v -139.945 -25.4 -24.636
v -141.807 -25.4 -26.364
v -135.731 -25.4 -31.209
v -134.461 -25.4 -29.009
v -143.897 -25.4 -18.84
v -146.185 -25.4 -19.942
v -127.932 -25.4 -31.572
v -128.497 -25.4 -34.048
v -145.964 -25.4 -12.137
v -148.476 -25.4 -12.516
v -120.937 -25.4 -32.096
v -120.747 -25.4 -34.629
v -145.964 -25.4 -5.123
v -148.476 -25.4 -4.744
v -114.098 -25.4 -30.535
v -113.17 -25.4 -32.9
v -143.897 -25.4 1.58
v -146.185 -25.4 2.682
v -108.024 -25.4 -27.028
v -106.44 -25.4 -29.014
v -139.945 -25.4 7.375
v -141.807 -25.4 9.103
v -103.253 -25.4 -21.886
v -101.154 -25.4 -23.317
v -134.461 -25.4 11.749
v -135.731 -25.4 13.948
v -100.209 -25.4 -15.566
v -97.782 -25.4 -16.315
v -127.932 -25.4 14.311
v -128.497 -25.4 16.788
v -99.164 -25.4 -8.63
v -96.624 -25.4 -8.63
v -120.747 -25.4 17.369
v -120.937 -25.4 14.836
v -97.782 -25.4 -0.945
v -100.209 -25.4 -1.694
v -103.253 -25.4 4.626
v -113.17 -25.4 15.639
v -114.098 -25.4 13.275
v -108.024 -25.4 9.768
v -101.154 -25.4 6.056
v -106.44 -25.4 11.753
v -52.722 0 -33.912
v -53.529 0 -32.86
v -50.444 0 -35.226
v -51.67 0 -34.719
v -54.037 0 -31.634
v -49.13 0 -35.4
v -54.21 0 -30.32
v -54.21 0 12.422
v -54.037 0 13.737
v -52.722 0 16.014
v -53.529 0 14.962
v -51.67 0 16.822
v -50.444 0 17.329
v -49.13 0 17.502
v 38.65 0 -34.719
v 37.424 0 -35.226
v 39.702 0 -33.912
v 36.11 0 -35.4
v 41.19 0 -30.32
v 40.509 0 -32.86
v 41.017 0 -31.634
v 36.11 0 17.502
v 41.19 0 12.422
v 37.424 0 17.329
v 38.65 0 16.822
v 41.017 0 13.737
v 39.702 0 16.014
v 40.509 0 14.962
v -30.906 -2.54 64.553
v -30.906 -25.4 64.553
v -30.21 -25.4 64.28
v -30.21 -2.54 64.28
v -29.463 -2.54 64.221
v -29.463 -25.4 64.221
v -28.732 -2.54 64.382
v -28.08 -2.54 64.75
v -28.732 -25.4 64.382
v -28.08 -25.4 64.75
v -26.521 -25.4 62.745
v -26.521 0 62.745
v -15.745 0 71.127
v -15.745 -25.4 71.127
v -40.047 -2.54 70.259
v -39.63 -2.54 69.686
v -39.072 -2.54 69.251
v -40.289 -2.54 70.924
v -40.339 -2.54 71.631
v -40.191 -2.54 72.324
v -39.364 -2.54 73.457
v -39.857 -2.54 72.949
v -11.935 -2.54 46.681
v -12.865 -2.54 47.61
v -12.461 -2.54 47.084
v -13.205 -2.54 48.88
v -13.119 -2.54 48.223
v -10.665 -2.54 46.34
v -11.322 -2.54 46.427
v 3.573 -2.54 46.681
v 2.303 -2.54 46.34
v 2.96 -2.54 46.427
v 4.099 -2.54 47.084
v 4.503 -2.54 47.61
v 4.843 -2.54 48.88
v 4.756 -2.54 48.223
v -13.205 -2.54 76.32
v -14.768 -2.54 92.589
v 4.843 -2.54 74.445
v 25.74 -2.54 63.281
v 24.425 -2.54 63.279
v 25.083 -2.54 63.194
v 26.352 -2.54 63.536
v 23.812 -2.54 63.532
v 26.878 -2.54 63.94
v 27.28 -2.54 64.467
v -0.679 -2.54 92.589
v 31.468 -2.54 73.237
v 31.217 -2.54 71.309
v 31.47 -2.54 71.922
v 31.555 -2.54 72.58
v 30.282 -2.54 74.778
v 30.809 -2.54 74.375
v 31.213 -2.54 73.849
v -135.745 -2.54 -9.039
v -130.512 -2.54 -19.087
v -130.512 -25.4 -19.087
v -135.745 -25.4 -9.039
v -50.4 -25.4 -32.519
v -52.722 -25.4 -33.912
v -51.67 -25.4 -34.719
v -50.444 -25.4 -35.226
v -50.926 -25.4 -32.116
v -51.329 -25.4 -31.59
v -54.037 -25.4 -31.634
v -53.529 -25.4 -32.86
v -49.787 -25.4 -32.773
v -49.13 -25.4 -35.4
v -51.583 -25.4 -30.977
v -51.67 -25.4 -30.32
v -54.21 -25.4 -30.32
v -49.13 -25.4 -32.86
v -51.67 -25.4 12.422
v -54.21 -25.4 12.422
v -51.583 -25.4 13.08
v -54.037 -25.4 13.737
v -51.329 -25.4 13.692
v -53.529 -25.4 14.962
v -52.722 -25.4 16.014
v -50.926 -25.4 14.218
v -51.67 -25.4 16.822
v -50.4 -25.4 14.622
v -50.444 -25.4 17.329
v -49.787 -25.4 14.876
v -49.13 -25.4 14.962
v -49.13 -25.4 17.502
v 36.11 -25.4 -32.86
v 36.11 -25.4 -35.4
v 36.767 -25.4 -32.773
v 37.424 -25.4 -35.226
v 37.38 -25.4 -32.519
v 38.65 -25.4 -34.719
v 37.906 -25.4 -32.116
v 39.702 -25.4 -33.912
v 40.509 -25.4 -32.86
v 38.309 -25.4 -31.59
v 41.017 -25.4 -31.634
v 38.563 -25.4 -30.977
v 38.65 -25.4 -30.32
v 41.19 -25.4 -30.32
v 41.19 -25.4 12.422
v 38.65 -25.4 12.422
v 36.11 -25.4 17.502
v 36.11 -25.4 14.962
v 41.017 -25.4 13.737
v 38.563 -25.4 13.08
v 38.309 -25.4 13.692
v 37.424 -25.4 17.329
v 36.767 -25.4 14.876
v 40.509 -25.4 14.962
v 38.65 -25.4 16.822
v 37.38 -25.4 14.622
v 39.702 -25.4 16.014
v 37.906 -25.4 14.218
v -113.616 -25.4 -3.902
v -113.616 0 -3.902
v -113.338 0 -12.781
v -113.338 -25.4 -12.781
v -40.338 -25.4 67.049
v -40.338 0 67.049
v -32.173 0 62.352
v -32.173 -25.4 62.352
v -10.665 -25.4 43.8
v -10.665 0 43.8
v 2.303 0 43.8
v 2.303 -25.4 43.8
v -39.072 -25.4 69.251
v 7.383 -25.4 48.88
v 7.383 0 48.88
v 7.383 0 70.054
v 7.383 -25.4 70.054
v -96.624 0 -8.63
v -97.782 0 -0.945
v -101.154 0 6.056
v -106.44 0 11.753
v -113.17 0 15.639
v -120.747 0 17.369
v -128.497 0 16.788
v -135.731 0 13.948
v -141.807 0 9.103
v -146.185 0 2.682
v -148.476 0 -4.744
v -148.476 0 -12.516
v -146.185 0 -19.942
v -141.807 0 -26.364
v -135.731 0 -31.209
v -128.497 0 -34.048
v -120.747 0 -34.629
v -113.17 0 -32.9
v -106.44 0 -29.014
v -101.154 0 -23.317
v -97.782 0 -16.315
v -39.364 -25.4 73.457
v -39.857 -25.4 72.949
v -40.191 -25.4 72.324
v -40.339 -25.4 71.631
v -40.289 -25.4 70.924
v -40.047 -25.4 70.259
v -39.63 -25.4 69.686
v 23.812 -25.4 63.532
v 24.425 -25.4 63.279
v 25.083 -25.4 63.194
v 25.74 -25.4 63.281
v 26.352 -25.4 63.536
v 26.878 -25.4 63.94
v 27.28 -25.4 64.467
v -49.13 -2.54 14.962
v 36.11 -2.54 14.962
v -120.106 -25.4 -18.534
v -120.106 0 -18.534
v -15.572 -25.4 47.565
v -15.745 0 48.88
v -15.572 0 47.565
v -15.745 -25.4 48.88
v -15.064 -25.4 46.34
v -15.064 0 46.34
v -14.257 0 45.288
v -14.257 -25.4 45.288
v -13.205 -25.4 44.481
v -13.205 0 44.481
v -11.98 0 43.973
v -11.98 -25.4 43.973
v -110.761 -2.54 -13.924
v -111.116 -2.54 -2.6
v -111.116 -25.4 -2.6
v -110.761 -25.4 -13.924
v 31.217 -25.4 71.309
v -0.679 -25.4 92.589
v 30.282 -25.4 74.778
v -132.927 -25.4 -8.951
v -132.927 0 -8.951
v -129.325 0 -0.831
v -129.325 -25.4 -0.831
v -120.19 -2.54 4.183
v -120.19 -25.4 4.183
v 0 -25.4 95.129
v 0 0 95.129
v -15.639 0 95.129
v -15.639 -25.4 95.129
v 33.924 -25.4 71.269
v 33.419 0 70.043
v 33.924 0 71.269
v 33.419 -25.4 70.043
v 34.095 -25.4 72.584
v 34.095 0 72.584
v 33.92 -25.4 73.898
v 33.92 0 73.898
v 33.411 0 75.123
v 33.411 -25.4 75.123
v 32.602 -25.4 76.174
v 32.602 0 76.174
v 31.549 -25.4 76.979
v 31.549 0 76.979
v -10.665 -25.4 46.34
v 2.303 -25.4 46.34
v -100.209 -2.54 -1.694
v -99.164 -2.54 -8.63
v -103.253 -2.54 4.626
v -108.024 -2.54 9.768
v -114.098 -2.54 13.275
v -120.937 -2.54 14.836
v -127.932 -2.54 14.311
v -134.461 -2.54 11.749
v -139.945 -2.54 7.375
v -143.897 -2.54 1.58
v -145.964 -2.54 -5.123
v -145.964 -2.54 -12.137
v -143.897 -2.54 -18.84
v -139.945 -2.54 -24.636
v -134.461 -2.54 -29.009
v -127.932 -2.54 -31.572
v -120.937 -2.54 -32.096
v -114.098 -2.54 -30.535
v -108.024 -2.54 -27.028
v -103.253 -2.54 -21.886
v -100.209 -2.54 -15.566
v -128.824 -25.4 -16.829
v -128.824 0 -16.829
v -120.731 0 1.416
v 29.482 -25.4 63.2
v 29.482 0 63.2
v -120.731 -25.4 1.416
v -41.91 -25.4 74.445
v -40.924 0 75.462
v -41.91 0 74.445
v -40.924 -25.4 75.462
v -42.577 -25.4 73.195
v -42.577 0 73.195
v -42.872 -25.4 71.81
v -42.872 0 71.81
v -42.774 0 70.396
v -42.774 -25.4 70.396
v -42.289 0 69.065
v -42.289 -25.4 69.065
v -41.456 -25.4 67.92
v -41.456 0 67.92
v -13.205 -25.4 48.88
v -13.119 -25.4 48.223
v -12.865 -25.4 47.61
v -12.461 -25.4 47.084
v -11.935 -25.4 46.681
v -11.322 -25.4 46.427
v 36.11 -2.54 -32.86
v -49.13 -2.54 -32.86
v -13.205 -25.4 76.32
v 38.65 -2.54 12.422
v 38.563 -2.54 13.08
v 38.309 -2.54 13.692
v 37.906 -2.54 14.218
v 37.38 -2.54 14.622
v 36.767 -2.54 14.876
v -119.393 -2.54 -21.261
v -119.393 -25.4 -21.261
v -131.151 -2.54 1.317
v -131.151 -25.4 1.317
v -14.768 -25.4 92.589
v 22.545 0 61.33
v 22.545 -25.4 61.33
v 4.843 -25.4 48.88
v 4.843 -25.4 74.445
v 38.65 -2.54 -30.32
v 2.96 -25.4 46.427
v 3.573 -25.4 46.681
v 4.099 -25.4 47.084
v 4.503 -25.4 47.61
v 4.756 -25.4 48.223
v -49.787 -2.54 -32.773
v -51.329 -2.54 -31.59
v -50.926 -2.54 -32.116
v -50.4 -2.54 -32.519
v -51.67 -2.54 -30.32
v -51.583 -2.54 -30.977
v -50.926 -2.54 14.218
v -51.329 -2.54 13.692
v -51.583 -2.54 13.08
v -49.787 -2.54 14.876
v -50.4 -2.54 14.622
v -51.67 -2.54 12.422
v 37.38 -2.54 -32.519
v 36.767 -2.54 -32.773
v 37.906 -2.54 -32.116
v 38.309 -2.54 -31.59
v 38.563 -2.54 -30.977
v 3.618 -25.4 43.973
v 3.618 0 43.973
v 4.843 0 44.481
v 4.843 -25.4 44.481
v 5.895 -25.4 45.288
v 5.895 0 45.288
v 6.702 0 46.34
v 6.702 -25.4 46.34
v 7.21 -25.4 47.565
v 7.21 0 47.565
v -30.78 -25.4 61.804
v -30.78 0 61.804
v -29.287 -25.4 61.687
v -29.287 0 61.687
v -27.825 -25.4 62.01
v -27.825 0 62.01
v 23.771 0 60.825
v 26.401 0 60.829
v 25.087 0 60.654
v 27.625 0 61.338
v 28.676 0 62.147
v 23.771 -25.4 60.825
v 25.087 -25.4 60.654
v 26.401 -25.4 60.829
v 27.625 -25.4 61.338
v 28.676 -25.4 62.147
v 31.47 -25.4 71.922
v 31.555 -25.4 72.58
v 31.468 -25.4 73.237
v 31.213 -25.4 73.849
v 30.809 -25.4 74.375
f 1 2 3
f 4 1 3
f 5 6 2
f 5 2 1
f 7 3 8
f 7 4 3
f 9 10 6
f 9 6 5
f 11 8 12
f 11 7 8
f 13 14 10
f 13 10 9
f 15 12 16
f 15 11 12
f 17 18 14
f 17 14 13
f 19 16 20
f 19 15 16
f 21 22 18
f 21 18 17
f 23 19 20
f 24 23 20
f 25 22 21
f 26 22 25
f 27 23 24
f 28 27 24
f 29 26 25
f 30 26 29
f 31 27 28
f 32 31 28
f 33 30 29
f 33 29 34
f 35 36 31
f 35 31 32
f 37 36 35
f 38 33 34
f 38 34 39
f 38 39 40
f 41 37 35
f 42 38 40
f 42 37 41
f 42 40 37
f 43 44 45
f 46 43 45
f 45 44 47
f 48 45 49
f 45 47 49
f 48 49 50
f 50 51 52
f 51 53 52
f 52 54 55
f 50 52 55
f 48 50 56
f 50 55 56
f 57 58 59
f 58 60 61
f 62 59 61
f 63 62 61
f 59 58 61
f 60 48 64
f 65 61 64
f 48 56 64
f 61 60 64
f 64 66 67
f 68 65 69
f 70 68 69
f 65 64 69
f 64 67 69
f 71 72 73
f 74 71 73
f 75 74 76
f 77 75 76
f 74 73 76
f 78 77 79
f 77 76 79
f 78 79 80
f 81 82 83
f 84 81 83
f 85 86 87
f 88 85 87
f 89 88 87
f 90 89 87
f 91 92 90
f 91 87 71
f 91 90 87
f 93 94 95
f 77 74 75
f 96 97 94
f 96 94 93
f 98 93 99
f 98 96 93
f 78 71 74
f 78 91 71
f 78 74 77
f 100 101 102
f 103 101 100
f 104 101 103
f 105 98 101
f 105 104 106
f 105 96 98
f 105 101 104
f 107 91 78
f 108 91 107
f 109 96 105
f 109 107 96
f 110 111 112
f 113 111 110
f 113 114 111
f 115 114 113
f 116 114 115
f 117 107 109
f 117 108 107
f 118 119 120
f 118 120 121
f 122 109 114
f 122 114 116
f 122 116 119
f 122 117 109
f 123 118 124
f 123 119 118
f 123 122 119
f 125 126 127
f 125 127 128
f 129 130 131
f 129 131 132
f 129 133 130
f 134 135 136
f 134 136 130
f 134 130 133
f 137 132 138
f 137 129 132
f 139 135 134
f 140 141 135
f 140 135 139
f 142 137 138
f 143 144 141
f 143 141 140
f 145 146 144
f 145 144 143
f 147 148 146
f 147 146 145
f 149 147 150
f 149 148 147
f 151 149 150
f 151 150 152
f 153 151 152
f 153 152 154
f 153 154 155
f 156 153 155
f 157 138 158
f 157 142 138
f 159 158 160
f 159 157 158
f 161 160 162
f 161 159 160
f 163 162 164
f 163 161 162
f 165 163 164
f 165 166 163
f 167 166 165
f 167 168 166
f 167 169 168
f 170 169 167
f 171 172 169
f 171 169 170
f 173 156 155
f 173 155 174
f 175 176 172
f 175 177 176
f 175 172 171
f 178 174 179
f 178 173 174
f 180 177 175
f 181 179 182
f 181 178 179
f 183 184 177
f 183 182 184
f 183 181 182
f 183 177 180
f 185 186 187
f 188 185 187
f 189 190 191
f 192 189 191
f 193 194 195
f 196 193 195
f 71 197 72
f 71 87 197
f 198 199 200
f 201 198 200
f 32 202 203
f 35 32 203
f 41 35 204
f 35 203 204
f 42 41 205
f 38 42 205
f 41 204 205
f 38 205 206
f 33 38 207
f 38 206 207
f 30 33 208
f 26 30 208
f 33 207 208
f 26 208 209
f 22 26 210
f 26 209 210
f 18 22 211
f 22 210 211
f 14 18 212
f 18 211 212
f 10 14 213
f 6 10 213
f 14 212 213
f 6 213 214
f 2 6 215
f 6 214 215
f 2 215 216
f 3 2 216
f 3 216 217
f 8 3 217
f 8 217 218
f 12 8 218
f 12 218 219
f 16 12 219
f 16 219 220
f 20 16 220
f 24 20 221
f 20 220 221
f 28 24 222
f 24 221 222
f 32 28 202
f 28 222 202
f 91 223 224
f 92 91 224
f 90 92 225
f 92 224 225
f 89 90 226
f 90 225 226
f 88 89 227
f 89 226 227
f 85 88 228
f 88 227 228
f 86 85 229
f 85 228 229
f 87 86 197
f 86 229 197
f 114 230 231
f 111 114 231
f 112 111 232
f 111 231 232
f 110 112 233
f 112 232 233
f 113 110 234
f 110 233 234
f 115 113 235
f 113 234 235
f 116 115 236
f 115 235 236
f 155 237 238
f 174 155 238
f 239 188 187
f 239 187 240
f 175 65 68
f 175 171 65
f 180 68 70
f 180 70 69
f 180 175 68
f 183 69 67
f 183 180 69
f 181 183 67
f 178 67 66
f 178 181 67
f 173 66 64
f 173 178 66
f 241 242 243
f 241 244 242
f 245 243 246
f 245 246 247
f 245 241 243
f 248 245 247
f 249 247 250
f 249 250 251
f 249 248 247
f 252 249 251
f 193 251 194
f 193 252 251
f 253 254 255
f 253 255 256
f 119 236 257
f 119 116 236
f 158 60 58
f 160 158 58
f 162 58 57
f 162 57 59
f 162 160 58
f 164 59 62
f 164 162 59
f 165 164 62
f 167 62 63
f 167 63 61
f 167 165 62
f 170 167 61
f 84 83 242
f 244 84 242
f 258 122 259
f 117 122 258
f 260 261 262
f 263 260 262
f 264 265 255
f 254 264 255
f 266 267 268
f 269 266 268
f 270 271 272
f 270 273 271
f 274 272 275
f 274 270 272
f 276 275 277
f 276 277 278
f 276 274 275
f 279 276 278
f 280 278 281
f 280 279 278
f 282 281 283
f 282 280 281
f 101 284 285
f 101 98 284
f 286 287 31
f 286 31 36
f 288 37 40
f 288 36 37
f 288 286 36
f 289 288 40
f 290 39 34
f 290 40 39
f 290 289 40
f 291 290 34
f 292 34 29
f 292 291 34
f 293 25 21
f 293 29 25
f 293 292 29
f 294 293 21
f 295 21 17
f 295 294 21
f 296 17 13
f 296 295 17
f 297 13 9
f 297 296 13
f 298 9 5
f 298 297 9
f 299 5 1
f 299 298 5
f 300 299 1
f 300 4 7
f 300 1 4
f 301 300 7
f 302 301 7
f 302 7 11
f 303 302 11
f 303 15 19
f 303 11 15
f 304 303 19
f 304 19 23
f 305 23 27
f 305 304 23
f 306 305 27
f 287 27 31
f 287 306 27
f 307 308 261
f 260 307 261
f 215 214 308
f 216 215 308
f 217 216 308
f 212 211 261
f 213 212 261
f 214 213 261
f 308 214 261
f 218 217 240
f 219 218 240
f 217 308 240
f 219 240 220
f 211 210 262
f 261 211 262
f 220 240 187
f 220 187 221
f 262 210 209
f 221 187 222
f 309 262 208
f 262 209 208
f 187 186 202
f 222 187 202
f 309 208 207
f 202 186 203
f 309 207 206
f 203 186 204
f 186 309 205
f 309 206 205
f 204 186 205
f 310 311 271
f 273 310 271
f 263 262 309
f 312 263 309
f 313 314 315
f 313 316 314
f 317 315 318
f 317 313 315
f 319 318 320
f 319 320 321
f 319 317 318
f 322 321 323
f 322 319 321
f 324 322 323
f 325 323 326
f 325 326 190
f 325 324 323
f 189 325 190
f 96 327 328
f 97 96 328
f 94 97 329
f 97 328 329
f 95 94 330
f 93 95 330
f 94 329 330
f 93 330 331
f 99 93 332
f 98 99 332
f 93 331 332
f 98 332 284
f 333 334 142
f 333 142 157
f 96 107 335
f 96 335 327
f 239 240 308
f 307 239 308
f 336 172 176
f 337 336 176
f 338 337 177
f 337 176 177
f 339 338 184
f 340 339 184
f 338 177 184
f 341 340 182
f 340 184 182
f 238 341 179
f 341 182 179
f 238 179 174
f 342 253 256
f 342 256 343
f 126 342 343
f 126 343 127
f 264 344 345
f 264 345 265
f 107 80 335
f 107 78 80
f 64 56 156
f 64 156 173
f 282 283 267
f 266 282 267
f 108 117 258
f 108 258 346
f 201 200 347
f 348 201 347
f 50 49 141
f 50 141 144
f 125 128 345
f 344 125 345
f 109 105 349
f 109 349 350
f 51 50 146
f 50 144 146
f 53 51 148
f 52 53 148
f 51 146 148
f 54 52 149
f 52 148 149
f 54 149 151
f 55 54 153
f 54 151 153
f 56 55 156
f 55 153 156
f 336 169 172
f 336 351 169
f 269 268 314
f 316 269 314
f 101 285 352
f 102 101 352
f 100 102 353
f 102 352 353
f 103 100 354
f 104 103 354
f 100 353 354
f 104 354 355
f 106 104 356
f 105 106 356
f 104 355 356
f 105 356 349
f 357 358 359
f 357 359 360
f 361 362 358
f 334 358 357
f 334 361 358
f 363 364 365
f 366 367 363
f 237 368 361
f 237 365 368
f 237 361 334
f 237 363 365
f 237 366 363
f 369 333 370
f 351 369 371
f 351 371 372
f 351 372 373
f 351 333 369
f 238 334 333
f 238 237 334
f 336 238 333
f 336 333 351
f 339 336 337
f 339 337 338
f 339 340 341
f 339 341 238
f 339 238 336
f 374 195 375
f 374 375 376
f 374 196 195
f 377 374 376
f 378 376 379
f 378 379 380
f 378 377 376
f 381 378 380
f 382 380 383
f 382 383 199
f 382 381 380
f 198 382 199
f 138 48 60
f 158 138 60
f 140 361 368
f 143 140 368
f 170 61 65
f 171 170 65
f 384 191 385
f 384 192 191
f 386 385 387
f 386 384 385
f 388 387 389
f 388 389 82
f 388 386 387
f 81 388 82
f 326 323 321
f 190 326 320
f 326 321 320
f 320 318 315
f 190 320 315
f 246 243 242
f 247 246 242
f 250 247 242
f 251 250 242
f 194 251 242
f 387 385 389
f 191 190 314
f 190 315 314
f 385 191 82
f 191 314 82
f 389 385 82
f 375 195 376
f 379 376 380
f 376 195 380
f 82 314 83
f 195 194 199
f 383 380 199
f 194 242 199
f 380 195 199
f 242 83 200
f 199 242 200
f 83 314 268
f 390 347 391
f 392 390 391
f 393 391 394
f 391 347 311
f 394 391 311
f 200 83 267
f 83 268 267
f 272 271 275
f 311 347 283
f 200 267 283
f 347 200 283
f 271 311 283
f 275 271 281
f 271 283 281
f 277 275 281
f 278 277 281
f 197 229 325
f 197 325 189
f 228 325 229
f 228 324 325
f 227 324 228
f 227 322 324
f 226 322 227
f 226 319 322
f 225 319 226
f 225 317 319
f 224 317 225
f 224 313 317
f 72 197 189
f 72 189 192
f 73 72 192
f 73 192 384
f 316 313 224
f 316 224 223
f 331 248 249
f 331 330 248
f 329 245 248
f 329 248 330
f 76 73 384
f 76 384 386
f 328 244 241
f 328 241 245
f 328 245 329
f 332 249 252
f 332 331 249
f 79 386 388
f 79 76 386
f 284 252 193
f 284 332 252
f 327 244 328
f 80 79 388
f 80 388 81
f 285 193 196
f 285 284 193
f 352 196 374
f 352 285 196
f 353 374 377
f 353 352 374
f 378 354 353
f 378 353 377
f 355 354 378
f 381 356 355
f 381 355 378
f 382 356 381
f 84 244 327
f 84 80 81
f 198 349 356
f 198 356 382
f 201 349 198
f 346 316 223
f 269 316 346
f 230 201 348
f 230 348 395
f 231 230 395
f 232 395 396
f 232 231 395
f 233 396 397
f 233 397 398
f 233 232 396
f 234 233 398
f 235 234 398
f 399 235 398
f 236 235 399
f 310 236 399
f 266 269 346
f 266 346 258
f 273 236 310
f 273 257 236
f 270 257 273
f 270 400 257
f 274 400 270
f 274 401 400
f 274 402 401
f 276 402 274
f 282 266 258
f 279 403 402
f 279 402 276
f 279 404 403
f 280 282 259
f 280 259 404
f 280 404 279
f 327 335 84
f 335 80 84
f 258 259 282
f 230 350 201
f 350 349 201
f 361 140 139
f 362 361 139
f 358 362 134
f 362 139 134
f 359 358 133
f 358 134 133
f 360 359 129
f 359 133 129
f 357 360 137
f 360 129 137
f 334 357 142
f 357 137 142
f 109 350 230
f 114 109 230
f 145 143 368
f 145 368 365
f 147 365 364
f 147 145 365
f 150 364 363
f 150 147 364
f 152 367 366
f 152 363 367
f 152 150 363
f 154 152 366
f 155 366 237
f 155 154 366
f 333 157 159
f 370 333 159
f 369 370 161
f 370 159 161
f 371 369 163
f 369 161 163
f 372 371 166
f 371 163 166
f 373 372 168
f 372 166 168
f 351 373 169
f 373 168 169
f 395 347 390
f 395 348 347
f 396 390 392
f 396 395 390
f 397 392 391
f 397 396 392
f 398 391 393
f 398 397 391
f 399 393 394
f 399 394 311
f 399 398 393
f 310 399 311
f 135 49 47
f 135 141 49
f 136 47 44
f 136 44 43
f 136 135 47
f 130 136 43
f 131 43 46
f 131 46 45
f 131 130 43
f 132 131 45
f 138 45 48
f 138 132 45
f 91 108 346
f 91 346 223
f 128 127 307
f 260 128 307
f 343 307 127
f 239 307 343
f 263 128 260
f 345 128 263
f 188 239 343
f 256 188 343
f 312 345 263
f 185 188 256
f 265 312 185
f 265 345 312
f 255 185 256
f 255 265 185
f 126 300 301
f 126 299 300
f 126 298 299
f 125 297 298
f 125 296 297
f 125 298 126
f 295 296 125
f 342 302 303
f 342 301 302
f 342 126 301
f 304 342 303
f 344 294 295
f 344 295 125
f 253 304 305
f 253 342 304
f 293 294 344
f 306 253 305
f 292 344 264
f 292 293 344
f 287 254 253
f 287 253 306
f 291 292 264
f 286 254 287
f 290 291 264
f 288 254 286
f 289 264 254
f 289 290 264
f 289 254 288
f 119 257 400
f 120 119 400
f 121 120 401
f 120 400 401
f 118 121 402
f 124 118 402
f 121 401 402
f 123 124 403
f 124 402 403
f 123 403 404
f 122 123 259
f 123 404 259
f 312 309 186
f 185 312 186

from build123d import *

# Parameters (mm, degrees)
F0_W     = 95.3992977738
F0_H     = 52.9018118978
F1_DEPTH = 25.4
F0_R     = 26.0717116196
F2_R     = 5.08
F2_2_R   = 5.08
F3_T     = -2.54
F3_2_T   = -2.54
F3_3_T   = -2.54


with BuildPart() as f1:
    # F0 (on Front) → F1 (new body)
    with BuildSketch(Plane.XZ):
        with Locations((-6.5099671483, -8.9486204088)):
            Rectangle(F0_W, F0_H)
    extrude(amount=F1_DEPTH)

    # F2
    f2_edges = [f1.edges().sort_by_distance(p)[0] for p in [
        (41.189682, -12.7, 17.502286),
        (-54.209616, -12.7, 17.502286),
        (41.189682, -12.7, -35.399526),
        (-54.209616, -12.7, -35.399526),
    ]]
    fillet(f2_edges, radius=F2_R)

    # F3
    f3_openings = [f1.faces().sort_by_distance(p)[0] for p in [
        (-6.509967, -25.4, -8.94862),
    ]]
    offset(amount=F3_T, openings=f3_openings)


with BuildPart() as f1b:
    # F0 (on Front) → F1, piece 2 (new body)
    with BuildSketch(Plane.XZ):
        Polygon((-15.7450778402, 71.1268408825), (-15.7450778402, 43.8002683285), (7.3828132831, 43.8002683285), (7.3828132831, 70.0535550776), (26.9487652202, 58.7970262781), (35.9517936882, 74.4459732518), (0, 95.1294749975), (-15.639244779, 95.1294749975), (-46.8923002481, 70.8196386695), (-29.2148078451, 60.6495634807), align=None)
    extrude(amount=F1_DEPTH)

    # F2#2
    f2_2_edges = [f1b.edges().sort_by_distance(p)[0] for p in [
        (-15.745078, -12.7, 43.800268),
        (7.382813, -12.7, 43.800268),
        (-29.214808, -12.7, 60.649563),
        (-46.8923, -12.7, 70.819639),
        (26.948765, -12.7, 58.797026),
        (35.951794, -12.7, 74.445973),
    ]]
    fillet(f2_2_edges, radius=F2_2_R)

    # F3#2
    f3_2_openings = [f1b.faces().sort_by_distance(p)[0] for p in [
        (-4.405798, -25.4, 71.992638),
    ]]
    offset(amount=F3_2_T, openings=f3_2_openings, kind=Kind.INTERSECTION)


with BuildPart() as f1c:
    # F0 (on Front) → F1, piece 3 (new body)
    with BuildSketch(Plane.XZ):
        with Locations((-122.6953491569, -8.6302654818)):
            Circle(F0_R)
        Polygon((-113.6160777227, -3.9024062982), (-113.338126855, -12.7809537413), (-120.1063552331, -18.5339482663), (-128.8241488417, -16.8292676563), (-132.9268312828, -8.9505711797), (-129.3249989989, -0.8306779795), (-120.7309051638, 1.4159667489), align=None, mode=Mode.SUBTRACT)
    extrude(amount=F1_DEPTH)

    # F3#3
    f3_3_openings = [f1c.faces().sort_by_distance(p)[0] for p in [
        (-148.029641, -25.4, -8.630265),
    ]]
    offset(amount=F3_3_T, openings=f3_3_openings, kind=Kind.INTERSECTION)


solid = Compound([f1.part, f1b.part, f1c.part])
